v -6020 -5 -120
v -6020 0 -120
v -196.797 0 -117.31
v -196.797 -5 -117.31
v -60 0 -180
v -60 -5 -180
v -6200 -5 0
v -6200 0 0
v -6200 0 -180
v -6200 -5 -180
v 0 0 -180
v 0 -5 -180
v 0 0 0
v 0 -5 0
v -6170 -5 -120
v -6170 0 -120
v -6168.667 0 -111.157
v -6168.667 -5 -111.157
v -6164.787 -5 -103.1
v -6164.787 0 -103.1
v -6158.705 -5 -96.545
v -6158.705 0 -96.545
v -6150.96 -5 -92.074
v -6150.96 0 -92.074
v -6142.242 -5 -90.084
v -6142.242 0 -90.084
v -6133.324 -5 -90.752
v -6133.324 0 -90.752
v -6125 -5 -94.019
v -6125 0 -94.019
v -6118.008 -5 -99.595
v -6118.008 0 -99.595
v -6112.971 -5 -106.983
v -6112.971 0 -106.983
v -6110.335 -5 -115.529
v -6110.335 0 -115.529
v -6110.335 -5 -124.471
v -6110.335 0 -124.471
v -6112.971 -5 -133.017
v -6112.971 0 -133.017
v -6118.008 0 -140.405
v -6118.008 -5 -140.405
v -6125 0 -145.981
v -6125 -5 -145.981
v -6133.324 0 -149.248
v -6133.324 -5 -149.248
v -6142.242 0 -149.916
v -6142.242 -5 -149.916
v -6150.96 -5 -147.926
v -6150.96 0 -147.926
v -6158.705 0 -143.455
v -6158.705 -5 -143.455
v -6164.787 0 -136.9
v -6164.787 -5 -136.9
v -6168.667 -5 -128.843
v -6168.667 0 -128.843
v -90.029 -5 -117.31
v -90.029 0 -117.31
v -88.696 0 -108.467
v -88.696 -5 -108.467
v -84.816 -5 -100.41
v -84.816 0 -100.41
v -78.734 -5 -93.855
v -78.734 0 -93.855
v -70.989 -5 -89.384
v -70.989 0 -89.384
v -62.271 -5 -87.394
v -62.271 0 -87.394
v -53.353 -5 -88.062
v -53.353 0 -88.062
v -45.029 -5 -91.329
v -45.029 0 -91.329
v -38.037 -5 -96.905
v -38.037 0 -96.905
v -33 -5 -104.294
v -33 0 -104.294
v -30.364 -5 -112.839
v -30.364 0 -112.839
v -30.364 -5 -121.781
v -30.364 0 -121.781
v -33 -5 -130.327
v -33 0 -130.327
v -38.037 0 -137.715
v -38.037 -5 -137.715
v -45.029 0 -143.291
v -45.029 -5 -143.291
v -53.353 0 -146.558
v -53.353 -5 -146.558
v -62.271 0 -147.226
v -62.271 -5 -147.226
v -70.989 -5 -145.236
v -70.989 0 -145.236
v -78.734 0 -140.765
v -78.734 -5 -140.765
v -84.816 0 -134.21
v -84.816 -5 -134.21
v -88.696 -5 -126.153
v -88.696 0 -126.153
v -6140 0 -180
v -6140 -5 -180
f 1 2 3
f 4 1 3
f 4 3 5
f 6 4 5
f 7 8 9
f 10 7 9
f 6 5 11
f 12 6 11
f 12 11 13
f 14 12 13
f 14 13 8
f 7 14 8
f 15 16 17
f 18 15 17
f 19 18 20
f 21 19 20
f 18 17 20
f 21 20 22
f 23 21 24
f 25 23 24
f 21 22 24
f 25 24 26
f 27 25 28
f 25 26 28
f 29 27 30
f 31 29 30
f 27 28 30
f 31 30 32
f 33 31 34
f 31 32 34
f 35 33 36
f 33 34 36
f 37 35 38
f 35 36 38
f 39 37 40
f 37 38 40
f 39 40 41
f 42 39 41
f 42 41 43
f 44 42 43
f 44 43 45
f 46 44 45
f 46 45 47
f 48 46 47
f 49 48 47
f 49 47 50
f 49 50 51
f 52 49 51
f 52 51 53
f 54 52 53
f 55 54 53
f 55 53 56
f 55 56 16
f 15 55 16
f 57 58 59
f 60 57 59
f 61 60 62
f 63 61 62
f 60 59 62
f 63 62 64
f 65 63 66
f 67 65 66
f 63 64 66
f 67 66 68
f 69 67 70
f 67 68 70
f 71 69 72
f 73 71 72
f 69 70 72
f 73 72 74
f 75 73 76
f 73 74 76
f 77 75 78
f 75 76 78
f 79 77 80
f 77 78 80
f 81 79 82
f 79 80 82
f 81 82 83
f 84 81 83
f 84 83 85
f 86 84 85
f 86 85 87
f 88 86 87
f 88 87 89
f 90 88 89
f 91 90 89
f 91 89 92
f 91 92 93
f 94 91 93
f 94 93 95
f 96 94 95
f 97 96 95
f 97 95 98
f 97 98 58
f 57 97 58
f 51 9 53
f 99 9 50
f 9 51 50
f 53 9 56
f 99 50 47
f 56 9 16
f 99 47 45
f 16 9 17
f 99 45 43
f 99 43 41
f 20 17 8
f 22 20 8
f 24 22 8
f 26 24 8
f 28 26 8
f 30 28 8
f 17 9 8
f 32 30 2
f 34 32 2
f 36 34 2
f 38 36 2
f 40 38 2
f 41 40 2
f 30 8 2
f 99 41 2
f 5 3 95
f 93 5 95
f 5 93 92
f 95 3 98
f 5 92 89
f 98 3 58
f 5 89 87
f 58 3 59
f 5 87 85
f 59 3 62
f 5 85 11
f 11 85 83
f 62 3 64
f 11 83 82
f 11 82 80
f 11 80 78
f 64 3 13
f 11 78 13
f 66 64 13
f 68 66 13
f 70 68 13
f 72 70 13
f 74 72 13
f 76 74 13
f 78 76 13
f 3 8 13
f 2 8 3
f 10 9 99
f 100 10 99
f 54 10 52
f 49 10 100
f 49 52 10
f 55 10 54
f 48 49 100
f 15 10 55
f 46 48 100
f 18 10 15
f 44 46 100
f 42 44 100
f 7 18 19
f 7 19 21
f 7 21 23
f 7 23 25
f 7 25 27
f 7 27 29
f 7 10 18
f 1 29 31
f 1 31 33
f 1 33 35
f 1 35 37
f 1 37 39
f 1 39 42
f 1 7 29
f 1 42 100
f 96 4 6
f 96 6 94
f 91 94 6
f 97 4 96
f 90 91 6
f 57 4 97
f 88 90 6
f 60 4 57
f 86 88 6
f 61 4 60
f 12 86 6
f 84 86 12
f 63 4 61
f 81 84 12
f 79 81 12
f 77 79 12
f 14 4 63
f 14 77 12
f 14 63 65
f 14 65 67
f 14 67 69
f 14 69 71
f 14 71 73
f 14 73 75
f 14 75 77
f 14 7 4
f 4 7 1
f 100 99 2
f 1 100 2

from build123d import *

# Parameters (mm, degrees)
F1_DEPTH = 5
F3_D     = 60


with BuildPart() as f1:
    # F0 (on Front) → F1 (new body)
    with BuildSketch(Plane.XZ):
        Polygon((0, -180), (0, 0), (-6200, 0), (-6200, -180), (-6140, -180), (-6020, -120), (-196.797047, -117.310032), (-60, -180), align=None)
    extrude(amount=F1_DEPTH)

    # F3 (through all)
    with Locations(Plane.XZ.offset(5)):
        with Locations((-60.028959, -117.310032), (-6140, -120)):
            Hole(F3_D / 2)


solid = f1.part
